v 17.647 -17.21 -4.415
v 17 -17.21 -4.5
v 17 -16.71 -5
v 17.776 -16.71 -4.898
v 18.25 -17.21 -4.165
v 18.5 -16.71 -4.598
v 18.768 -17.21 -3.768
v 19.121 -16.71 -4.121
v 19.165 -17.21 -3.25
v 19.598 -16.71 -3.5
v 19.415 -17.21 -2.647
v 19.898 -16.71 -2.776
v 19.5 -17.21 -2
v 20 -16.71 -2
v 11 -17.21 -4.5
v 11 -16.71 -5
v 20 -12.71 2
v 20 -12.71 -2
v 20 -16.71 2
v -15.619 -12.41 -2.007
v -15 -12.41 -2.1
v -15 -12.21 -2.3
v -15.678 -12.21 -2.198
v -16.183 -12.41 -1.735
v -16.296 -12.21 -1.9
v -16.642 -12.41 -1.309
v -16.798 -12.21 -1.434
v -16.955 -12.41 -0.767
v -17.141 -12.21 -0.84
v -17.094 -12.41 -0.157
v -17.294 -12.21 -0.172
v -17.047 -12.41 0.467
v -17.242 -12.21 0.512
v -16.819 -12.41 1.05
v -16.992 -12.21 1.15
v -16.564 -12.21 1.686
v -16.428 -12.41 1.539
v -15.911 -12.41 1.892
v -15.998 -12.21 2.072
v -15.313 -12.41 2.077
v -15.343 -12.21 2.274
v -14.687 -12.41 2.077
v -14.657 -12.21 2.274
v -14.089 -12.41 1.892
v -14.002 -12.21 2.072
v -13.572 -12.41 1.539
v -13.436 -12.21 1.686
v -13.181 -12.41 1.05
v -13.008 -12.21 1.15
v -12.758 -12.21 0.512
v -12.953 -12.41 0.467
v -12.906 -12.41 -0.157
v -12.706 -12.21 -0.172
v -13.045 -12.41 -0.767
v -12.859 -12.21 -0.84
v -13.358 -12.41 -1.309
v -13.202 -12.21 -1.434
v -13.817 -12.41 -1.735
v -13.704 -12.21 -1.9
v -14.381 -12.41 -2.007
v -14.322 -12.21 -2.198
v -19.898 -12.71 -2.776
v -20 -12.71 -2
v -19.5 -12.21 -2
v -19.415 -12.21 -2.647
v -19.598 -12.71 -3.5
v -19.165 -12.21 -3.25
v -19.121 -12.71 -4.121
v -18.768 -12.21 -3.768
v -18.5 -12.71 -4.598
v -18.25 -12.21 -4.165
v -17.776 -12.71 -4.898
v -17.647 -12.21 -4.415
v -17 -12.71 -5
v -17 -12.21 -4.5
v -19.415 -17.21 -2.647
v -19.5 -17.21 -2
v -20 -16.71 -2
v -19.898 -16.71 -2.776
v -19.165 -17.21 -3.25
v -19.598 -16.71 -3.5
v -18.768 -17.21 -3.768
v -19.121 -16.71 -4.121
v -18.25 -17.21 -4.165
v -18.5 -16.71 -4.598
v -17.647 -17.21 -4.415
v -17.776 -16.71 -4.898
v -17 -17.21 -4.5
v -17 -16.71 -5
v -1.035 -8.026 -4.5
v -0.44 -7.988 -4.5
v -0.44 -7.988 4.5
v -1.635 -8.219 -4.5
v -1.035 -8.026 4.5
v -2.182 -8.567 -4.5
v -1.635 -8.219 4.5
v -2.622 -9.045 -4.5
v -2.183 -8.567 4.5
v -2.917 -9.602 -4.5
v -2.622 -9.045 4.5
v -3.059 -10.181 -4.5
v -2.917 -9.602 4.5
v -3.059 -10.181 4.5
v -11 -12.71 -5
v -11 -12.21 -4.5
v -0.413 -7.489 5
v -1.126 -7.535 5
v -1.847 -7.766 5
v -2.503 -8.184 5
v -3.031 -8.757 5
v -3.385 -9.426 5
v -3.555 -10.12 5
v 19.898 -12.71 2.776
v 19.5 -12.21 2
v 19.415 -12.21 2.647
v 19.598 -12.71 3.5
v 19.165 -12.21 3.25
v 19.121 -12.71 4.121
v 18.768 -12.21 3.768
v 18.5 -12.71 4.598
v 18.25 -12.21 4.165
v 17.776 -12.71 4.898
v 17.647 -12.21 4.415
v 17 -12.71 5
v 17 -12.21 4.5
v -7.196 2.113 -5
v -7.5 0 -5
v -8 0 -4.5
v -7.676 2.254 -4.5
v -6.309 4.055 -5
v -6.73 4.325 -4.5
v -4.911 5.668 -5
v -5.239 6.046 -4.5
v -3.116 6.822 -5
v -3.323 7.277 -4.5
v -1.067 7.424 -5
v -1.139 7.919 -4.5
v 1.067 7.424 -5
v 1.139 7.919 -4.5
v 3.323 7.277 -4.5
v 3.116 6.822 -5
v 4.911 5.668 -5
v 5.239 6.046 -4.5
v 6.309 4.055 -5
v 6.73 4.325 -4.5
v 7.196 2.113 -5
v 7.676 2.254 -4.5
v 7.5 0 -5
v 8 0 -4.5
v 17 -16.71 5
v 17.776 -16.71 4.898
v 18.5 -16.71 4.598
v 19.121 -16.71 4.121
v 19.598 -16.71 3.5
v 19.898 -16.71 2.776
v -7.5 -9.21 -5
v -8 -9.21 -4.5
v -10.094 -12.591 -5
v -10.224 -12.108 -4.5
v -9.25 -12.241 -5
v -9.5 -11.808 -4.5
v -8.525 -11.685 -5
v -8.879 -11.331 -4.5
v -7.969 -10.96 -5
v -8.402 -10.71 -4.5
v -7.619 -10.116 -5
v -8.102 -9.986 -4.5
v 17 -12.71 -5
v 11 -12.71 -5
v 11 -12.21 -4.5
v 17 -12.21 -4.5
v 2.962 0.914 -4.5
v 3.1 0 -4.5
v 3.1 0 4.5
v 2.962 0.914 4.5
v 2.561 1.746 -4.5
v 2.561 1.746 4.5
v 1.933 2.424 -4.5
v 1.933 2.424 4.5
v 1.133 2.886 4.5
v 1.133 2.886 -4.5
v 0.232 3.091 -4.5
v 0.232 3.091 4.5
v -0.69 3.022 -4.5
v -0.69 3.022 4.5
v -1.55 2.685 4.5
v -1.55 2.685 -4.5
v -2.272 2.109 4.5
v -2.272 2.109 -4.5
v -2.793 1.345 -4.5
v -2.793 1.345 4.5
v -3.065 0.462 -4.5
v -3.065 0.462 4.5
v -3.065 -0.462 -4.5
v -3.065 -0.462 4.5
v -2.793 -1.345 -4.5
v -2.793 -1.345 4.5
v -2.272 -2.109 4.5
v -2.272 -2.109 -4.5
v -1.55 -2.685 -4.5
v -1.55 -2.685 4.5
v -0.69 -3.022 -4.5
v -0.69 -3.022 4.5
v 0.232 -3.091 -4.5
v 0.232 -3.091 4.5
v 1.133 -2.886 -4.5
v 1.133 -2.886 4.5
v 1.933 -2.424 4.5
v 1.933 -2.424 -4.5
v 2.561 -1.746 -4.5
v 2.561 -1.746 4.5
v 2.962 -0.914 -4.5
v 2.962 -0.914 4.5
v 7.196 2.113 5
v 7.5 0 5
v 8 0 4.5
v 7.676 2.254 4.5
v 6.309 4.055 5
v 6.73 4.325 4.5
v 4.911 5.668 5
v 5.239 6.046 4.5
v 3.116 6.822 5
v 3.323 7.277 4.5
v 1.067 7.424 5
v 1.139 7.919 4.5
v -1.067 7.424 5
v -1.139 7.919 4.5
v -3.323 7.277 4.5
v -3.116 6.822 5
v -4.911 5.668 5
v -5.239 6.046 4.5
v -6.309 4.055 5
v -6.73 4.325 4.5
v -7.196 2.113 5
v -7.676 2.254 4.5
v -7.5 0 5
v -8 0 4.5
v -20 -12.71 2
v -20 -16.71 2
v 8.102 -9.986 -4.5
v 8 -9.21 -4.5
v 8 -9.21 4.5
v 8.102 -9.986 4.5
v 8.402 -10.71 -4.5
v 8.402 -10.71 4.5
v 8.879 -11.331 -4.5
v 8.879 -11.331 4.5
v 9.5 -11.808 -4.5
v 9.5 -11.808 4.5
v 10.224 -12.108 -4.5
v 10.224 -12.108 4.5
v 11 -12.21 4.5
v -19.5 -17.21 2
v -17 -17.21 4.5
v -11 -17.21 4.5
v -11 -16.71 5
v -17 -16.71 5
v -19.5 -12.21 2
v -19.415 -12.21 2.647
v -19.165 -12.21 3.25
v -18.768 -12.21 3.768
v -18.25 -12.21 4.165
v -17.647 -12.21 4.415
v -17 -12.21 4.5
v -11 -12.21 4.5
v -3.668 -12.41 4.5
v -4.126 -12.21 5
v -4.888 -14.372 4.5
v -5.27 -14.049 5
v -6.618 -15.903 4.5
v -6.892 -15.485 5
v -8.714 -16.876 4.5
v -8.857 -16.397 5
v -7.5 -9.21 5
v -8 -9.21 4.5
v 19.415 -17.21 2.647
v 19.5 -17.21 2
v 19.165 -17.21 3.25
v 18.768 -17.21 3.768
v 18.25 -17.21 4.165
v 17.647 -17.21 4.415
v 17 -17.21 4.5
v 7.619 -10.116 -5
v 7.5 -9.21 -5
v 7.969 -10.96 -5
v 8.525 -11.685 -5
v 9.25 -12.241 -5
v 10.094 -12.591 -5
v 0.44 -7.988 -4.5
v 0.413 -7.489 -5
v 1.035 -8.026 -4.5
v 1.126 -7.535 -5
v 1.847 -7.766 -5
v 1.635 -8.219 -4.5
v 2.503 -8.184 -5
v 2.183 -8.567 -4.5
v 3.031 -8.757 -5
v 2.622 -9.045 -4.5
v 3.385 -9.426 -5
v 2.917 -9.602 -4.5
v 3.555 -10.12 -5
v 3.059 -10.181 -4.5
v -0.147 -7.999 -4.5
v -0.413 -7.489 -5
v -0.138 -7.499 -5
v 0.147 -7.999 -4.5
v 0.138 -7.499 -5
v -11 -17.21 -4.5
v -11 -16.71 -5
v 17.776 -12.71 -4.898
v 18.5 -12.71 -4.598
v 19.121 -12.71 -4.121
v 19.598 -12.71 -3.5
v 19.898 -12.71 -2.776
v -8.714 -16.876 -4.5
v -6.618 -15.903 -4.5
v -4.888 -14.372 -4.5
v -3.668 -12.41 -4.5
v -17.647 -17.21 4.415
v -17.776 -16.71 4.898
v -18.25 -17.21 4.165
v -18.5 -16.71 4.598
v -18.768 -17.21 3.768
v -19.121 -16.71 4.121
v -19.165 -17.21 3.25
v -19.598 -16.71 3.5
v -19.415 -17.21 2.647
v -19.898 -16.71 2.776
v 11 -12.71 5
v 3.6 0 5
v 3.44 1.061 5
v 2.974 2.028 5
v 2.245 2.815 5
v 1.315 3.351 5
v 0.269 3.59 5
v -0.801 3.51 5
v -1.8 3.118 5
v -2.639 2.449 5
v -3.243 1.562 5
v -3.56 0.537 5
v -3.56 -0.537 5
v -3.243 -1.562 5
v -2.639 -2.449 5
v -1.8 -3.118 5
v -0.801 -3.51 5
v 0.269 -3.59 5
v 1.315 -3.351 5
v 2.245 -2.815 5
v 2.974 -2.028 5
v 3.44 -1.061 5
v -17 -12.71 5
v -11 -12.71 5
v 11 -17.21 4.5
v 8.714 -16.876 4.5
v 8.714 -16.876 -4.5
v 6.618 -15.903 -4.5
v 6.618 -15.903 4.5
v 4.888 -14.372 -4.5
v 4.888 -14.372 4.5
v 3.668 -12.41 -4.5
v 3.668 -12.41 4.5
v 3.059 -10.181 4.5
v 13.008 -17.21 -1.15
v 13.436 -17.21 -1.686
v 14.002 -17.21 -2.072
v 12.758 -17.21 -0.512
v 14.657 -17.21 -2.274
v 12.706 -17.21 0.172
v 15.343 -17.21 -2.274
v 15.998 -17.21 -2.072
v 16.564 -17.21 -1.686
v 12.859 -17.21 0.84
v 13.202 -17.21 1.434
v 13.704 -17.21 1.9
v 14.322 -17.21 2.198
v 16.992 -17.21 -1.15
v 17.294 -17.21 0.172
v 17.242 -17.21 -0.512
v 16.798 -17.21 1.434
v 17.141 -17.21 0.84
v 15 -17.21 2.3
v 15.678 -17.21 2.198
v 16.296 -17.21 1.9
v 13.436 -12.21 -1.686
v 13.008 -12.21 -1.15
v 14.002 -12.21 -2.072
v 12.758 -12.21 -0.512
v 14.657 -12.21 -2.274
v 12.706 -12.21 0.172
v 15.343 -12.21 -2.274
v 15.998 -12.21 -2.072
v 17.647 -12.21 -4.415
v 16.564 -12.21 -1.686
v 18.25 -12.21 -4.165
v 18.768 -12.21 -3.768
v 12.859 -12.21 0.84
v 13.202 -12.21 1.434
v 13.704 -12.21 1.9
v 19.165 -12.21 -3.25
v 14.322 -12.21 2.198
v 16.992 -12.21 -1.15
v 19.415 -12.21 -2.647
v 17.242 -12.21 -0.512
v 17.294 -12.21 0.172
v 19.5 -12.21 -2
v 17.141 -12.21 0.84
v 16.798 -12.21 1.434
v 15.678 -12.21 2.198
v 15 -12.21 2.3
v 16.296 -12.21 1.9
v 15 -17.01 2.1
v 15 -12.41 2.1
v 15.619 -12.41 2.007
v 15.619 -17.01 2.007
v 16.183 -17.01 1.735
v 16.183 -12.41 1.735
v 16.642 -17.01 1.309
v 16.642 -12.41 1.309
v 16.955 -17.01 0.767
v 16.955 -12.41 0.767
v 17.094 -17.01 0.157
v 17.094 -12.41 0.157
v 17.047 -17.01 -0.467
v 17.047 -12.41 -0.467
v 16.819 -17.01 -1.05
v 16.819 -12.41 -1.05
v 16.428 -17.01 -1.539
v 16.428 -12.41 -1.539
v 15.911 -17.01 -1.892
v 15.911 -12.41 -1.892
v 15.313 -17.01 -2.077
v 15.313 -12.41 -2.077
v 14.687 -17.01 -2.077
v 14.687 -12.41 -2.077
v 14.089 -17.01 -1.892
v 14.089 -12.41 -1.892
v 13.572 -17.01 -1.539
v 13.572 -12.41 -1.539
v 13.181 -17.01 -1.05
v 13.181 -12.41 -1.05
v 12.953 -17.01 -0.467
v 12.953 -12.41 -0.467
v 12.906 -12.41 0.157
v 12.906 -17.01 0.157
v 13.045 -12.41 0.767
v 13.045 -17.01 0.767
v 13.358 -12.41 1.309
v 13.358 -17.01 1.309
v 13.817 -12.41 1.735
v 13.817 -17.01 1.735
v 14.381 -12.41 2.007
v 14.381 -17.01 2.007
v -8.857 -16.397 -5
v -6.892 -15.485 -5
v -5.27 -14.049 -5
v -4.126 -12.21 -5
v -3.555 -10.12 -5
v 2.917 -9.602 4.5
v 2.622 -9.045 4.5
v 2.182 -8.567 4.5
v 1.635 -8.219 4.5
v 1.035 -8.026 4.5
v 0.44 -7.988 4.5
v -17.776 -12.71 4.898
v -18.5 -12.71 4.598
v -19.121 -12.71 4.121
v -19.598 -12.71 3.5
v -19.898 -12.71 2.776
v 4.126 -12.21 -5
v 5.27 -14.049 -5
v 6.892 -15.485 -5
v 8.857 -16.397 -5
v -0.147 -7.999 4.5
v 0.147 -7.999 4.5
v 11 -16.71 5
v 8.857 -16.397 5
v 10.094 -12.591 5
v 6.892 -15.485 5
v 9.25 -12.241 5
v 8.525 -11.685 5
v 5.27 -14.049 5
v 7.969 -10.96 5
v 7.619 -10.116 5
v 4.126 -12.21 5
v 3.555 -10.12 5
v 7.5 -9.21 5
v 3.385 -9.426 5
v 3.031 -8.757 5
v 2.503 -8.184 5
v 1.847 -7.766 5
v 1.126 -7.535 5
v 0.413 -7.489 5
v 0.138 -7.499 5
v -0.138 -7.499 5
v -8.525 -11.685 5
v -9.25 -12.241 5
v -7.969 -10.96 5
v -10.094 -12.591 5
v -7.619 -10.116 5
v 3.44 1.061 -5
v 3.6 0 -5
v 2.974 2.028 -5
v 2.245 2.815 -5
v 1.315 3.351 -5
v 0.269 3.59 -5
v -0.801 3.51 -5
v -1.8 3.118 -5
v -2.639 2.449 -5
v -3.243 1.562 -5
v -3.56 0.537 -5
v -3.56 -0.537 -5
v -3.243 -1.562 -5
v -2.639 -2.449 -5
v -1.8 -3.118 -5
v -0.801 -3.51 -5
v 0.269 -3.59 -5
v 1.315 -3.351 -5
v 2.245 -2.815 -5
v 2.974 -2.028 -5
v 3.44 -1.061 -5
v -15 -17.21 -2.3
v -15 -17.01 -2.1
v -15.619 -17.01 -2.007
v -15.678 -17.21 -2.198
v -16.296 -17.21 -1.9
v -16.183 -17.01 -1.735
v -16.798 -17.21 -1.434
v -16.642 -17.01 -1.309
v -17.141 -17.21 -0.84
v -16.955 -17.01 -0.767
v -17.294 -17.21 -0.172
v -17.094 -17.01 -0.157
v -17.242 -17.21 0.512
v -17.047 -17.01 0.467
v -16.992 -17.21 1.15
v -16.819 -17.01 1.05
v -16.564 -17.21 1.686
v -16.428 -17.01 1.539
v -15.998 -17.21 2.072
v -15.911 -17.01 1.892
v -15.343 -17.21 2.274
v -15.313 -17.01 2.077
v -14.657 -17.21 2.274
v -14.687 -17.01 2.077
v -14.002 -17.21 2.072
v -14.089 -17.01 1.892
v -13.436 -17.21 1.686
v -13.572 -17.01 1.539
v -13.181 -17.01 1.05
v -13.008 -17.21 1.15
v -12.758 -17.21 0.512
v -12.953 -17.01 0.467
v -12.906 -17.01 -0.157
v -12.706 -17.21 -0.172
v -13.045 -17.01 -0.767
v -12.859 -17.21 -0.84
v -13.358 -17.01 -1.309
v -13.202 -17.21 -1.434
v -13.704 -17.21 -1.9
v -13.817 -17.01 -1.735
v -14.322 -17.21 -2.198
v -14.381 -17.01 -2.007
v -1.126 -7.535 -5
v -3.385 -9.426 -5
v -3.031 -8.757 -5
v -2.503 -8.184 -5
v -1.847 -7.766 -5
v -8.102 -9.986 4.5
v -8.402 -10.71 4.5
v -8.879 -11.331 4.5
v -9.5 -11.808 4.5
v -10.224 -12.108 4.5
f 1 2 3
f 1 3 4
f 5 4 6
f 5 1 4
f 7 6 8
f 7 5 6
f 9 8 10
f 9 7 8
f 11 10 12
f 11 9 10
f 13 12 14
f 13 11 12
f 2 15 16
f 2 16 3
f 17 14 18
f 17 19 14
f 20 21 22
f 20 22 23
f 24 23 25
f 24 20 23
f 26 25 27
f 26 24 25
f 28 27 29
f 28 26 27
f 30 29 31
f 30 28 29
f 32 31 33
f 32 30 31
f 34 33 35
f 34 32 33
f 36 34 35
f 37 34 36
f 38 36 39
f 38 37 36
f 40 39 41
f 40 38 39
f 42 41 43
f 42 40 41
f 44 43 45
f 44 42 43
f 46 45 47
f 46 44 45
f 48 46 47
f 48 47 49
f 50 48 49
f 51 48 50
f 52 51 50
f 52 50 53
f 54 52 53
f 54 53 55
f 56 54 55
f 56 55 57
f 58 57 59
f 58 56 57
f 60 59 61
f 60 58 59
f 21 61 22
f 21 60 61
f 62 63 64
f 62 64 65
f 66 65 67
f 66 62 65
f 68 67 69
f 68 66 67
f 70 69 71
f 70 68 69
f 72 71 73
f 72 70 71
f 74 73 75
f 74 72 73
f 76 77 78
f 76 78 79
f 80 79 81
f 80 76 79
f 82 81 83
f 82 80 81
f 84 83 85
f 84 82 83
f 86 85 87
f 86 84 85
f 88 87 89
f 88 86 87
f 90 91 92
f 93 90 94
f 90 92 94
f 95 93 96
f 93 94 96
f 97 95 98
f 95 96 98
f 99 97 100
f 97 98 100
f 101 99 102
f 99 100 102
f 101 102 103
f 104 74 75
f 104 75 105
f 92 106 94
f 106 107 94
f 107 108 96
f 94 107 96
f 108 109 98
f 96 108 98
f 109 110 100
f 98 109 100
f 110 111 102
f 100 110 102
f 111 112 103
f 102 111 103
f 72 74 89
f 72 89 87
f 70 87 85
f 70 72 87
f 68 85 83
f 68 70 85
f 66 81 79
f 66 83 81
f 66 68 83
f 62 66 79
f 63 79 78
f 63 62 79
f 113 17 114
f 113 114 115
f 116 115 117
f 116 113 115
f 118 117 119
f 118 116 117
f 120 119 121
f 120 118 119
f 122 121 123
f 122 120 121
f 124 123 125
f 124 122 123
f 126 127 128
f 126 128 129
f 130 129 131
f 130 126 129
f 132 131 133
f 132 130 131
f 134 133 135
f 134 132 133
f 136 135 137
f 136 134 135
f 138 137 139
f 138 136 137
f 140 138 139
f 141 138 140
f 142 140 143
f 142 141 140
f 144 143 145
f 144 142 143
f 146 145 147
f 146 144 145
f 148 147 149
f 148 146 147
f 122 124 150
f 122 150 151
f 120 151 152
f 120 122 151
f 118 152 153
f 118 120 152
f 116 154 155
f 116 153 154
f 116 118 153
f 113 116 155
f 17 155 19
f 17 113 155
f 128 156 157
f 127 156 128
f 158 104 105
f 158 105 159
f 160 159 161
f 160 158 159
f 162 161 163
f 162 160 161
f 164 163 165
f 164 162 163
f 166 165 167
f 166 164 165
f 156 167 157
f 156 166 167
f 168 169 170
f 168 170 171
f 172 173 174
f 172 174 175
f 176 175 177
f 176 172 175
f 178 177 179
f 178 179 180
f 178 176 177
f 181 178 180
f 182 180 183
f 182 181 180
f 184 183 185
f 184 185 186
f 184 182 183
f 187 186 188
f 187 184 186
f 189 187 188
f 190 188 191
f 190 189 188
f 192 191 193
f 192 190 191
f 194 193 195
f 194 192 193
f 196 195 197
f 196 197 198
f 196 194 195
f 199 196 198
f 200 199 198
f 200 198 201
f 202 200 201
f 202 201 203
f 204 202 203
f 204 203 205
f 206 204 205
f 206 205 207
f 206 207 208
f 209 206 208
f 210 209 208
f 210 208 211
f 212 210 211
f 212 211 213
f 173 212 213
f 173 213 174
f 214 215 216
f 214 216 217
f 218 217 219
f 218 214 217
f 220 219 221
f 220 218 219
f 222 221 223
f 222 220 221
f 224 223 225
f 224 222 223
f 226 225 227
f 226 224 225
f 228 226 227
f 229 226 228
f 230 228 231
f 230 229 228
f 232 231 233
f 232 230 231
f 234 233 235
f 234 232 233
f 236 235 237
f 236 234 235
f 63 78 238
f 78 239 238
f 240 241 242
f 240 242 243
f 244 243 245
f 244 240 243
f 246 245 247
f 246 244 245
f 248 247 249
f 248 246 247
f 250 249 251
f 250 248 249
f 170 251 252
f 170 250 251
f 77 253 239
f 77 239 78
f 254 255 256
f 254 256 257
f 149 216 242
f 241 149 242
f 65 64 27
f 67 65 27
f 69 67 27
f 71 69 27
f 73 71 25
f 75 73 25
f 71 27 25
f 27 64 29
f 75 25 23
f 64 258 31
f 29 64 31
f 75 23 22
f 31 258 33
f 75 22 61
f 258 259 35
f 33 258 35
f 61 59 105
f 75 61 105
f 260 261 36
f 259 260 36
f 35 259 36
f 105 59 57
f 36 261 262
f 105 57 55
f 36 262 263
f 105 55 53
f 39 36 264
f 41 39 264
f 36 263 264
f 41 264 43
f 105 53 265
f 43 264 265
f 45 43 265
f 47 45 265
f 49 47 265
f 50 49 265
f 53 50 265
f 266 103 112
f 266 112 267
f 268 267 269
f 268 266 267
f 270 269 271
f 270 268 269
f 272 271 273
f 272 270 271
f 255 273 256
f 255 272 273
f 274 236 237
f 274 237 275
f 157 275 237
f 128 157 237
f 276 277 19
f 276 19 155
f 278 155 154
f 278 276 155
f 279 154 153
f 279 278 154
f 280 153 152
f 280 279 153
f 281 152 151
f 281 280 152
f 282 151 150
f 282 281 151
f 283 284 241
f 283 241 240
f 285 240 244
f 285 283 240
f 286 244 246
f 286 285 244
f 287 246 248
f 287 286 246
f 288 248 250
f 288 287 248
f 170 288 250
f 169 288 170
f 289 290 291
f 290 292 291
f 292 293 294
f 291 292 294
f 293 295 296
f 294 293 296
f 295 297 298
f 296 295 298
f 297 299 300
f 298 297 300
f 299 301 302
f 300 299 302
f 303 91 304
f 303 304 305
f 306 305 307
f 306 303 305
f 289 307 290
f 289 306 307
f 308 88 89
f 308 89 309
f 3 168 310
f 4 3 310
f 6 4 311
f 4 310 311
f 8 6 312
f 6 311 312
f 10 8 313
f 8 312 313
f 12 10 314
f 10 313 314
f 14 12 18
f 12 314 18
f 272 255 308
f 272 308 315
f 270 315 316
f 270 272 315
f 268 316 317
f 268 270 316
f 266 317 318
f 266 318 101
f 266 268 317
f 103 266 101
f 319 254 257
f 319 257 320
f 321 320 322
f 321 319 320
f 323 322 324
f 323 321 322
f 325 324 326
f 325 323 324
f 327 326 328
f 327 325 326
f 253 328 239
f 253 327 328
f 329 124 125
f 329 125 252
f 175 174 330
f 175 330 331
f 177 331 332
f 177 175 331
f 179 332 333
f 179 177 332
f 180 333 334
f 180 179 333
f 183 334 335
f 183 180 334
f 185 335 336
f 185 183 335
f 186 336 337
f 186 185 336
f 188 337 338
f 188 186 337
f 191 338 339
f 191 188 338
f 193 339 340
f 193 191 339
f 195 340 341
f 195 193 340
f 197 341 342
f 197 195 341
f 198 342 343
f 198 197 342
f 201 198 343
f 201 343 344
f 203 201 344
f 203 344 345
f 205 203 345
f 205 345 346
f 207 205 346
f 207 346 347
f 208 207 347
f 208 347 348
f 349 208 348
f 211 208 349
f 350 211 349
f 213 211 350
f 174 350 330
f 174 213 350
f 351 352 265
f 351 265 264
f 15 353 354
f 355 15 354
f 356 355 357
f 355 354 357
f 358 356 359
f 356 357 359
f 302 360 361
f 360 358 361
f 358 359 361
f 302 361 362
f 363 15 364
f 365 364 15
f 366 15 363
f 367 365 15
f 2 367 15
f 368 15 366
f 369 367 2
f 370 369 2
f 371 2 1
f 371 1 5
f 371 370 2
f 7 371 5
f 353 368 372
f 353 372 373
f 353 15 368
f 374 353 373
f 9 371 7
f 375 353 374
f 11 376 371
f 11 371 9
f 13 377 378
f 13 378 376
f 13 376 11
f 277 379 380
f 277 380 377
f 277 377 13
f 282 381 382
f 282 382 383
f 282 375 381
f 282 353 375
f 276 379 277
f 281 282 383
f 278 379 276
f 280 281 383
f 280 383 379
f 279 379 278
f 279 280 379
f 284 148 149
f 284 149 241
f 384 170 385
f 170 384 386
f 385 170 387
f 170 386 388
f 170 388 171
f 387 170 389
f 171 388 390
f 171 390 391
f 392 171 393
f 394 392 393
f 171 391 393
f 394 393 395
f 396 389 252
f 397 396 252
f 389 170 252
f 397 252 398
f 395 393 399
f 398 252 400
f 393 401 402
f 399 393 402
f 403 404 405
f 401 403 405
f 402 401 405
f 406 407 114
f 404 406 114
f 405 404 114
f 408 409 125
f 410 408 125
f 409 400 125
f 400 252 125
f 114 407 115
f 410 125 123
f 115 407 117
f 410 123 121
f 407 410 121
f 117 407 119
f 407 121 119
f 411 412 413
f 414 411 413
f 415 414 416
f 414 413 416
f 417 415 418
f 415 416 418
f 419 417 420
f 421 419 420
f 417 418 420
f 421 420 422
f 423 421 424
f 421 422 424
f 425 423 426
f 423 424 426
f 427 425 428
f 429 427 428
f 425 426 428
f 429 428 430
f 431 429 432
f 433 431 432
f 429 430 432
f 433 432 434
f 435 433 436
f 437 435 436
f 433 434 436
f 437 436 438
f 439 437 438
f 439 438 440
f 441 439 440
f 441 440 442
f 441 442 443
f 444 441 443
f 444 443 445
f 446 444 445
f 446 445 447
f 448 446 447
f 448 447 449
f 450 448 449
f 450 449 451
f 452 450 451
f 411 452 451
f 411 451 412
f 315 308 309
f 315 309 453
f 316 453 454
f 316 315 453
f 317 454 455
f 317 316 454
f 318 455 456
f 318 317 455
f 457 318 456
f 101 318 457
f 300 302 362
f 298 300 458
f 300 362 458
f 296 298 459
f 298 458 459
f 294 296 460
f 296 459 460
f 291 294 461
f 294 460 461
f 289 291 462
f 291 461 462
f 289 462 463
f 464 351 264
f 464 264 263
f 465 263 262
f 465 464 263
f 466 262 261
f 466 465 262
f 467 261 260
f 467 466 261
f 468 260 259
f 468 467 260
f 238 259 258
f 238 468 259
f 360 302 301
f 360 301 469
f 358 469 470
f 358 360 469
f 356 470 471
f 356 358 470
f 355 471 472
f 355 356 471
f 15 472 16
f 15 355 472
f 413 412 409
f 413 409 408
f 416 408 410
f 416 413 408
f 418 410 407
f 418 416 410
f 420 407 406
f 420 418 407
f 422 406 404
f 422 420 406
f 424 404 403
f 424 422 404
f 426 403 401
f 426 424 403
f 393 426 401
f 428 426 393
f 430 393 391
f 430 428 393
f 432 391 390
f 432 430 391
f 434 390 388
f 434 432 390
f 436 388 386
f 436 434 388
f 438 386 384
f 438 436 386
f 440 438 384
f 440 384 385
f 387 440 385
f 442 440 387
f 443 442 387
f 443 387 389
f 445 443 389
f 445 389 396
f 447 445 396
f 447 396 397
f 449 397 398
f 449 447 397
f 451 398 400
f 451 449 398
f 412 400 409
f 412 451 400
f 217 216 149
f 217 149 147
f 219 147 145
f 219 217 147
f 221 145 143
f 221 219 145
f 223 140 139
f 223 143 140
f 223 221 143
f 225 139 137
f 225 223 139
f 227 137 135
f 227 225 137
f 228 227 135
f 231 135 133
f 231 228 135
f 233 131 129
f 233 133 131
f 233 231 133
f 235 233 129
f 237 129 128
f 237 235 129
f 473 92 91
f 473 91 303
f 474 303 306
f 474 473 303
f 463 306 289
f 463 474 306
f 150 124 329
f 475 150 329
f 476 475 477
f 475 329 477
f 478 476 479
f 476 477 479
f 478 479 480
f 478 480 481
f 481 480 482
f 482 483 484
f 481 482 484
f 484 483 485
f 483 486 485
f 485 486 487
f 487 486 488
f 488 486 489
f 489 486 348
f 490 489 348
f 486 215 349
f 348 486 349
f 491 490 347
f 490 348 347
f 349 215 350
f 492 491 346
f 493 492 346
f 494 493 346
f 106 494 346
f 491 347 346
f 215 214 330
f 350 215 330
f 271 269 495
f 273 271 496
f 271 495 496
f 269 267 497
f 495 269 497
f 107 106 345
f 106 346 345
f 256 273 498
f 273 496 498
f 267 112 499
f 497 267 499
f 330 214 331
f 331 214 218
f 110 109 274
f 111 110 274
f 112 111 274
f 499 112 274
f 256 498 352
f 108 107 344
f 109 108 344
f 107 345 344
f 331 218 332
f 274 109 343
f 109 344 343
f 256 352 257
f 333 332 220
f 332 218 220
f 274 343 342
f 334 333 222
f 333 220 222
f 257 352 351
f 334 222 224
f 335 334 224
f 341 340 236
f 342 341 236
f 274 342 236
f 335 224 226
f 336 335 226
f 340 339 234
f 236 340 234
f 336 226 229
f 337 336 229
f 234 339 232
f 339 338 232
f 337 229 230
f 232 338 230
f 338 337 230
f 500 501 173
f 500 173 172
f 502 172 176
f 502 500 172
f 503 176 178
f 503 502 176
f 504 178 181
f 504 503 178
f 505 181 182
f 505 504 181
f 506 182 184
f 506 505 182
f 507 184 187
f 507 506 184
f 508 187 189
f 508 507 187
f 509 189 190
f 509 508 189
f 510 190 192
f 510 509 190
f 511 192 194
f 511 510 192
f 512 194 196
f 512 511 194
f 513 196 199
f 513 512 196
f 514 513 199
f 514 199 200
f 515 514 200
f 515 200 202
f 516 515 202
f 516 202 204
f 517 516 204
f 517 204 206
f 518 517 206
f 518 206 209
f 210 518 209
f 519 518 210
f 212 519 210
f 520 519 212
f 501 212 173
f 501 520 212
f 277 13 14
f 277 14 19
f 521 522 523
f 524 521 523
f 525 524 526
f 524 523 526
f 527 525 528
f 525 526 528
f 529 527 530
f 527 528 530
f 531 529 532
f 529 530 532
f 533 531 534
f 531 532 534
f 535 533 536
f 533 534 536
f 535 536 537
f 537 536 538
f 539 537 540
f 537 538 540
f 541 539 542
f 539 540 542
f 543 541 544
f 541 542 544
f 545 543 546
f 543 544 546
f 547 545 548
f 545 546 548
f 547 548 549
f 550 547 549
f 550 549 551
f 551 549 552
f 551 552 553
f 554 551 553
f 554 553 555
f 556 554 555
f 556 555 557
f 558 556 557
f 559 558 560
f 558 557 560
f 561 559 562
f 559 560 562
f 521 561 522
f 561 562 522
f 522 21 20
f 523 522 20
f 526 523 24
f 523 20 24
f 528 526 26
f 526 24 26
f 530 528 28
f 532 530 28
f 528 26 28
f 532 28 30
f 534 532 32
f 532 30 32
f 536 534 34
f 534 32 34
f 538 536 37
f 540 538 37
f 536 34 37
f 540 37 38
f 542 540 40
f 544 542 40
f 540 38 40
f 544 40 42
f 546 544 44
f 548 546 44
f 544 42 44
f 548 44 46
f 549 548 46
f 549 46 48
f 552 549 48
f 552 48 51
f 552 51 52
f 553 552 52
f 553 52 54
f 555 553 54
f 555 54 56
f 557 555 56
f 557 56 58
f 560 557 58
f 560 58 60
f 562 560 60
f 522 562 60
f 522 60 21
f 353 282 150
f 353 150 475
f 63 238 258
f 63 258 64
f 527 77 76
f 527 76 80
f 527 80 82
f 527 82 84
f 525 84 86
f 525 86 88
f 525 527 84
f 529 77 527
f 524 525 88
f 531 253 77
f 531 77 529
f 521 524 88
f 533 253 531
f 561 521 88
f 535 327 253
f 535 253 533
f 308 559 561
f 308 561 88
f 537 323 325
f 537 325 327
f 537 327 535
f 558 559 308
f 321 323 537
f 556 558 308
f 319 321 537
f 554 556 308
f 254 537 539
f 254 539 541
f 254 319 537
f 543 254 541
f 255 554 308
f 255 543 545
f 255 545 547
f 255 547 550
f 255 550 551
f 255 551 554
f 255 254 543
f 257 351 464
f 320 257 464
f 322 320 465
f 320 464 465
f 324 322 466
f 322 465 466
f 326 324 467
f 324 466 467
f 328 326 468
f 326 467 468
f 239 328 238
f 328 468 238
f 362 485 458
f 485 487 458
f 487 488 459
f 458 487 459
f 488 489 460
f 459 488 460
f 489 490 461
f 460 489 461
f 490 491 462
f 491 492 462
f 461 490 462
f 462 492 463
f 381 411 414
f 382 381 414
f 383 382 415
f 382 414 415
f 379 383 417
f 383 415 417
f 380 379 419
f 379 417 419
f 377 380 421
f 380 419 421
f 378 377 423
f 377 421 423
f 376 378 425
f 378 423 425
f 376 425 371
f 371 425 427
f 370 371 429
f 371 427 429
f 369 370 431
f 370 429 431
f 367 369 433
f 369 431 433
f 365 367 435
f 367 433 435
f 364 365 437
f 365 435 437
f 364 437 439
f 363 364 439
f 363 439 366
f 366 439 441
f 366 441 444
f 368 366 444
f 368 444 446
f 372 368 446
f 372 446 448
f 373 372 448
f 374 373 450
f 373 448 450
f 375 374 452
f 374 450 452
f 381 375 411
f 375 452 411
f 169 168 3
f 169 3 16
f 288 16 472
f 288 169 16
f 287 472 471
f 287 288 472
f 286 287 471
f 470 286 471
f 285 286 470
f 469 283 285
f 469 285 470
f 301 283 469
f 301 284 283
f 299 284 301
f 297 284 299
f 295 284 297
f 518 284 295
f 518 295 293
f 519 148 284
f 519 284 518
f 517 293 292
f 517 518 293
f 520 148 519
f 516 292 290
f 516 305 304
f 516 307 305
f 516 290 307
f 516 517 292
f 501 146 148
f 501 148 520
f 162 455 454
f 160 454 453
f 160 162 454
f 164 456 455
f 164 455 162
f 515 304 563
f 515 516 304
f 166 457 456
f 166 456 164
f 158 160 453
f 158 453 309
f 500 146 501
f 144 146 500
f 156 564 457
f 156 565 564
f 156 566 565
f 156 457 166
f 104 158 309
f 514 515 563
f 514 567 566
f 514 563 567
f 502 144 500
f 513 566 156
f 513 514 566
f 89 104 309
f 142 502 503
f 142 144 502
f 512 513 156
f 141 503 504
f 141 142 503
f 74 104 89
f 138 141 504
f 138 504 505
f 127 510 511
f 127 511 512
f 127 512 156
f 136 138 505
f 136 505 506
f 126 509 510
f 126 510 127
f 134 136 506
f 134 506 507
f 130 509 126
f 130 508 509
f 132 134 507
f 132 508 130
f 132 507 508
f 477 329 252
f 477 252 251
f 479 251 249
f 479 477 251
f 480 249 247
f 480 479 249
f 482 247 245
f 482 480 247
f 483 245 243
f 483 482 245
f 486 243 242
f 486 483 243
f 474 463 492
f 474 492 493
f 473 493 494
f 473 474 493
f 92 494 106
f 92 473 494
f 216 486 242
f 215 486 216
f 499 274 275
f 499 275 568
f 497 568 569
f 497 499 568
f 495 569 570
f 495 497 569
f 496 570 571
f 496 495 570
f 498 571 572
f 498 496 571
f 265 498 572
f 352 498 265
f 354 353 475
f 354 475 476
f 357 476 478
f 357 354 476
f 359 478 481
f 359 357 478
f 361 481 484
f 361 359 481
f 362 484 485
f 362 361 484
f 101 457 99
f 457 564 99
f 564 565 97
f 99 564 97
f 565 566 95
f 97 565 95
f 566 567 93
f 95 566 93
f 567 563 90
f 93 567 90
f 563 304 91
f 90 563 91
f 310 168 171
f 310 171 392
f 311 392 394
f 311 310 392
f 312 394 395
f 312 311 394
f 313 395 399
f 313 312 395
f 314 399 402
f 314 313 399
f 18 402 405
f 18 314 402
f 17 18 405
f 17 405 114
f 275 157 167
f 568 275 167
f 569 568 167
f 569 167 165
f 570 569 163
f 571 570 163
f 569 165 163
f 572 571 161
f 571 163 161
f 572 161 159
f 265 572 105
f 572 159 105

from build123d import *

# Parameters (mm, degrees)
SKETCH_1_R        = 8
SKETCH_1_R_2      = 3.1
EXTRUDE_1_DEPTH   = 5
SKETCH_1_W        = 40
SKETCH_1_H        = 5
EXTRUDE_1_2_DEPTH = 5
CHAMFER_7_SIZE    = 0.5
EXTRUDE1_START    = -10
EXTRUDE1_DEPTH    = 10
FILLET1_R         = 3
EXTRUDE2_START    = -4.5
EXTRUDE2_DEPTH    = 4.5
FILLET2_R         = 8
SKETCH3_R         = 2.1
EXTRUDE3_DEPTH    = 29.869431931
CHAMFER2_SIZE     = 0.2
EXTRUDE4_DEPTH    = 27.952441448
FILLET3_R         = 2.5
FILLET4_R         = 3
CHAMFER4_SIZE     = 0.5


with BuildPart() as part:
    # 草图1 → 凸台-拉伸1 (new, symmetric)
    with BuildSketch(Plane.XY):
        Circle(SKETCH_1_R)
        Circle(SKETCH_1_R_2, mode=Mode.SUBTRACT)
    extrude(amount=EXTRUDE_1_DEPTH, both=True)

    # 倒角7
    chamfer_7_edges = [part.edges().sort_by_distance(p)[0] for p in [
        (-3.1, 0, -5),
        (-3.1, 0, 5),
    ]]
    chamfer(chamfer_7_edges, length=CHAMFER_7_SIZE)



with BuildPart() as body_2:
    # 草图1 → Extrude 1 2 (new, symmetric)
    with BuildSketch(Plane.XY):
        with Locations((0, -14.71)):
            Rectangle(SKETCH_1_W, SKETCH_1_H)
    extrude(amount=EXTRUDE_1_2_DEPTH, both=True)


with BuildPart() as part_1:
    add(part.part)

    add(body_2.part)  # Extrude1 merges body 2
    # Sketch1 → Extrude1 (add)
    with BuildSketch(Plane(origin=(0, 0, -5), x_dir=(-1, 0, 0), z_dir=(0, 0, -1)).offset(EXTRUDE1_START)):
        with BuildLine():
            ThreePointArc((8, 0), (0, -8), (-8, 0))
            Line((-8, 0), (-8, -12.21))
            Line((-8, -12.21), (8, -12.21))
            Line((8, -12.21), (8, 0))
        make_face()
    extrude(amount=EXTRUDE1_DEPTH)

    # Fillet1
    fillet1_edges = [part_1.edges().sort_by_distance(p)[0] for p in [
        (8, -12.21, 0),
        (-8, -12.21, 0),
    ]]
    fillet(fillet1_edges, radius=FILLET1_R)

    # Sketch2 → Extrude2 (cut)
    with BuildSketch(Plane(origin=(0, 0, -5), x_dir=(-1, 0, 0), z_dir=(0, 0, -1)).offset(EXTRUDE2_START)):
        with BuildLine():
            ThreePointArc((3, -7.416198487), (0, -8), (-3, -7.416198487))
            Line((-3, -7.416198487), (-3, -17.21))
            Line((-3, -17.21), (3, -17.21))
            Line((3, -17.21), (3, -7.416198487))
        make_face()
    extrude2 = extrude(amount=EXTRUDE2_DEPTH, mode=Mode.SUBTRACT)

    # Mirror1: Extrude2 across plane
    add(extrude2.mirror(Plane.XY), mode=Mode.SUBTRACT)

    # Fillet2
    fillet2_edges = [part_1.edges().sort_by_distance(p)[0] for p in [
        (-3, -17.21, -2.75),
        (3, -17.21, -2.75),
        (3, -17.21, 2.75),
        (-3, -17.21, 2.75),
    ]]
    fillet(fillet2_edges, radius=FILLET2_R)

    # Sketch3 → Extrude3 (cut, through all)
    with BuildSketch(Plane(origin=(0, -12.21, 0), x_dir=(1, 0, 0), z_dir=(0, 1, 0))):
        with Locations(Location((15, 0, 0), (0, 0, 270))):
            Circle(SKETCH3_R)
        with Locations(Location((-15, 0, 0), (0, 0, 90))):
            Circle(SKETCH3_R)
    extrude(amount=-EXTRUDE3_DEPTH, mode=Mode.SUBTRACT)

    # Chamfer2
    chamfer2_edges = [part_1.edges().sort_by_distance(p)[0] for p in [
        (15, -17.21, -2.1),
        (15, -12.21, -2.1),
        (-15, -17.21, 2.1),
        (-15, -12.21, 2.1),
    ]]
    chamfer(chamfer2_edges, length=CHAMFER2_SIZE)

    # Sketch4 → Extrude4 (cut, through all)
    with BuildSketch(Plane(origin=(0, 0, -0.5), x_dir=(-1, 0, 0), z_dir=(0, 0, -1))):
        with BuildLine():
            Line((-11, -17.21), (11, -17.21))
            ThreePointArc((11, -17.21), (5.343145751, -14.866854249), (3, -9.21))
            Line((3, -9.21), (3, -7.416198487))
            ThreePointArc((3, -7.416198487), (0, -8), (-3, -7.416198487))
            Line((-3, -7.416198487), (-3, -9.21))
            ThreePointArc((-3, -9.21), (-5.343145751, -14.866854249), (-11, -17.21))
        make_face()
    extrude(amount=-EXTRUDE4_DEPTH, mode=Mode.SUBTRACT)

    # Fillet3
    fillet3_edges = [part_1.edges().sort_by_distance(p)[0] for p in [
        (-3, -7.416198487, 0),
        (3, -7.416198487, 0),
    ]]
    fillet(fillet3_edges, radius=FILLET3_R)

    # Fillet4
    fillet4_edges = [part_1.edges().sort_by_distance(p)[0] for p in [
        (20, -14.71, -5),
        (-20, -14.71, 5),
        (20, -14.71, 5),
        (-20, -14.71, -5),
    ]]
    fillet(fillet4_edges, radius=FILLET4_R)

    # Chamfer4
    chamfer4_edges = [part_1.edges().sort_by_distance(p)[0] for p in [
        (0, 8, 5),
        (0, -8, -5),
        (8, -4.605, -5),
        (0, -8, 5),
        (-5.697451281, -15.200240152, -5),
        (5.697451281, -15.200240152, 5),
        (-2.182501473, -8.567267514, -5),
        (-2.182501473, -8.567267514, 5),
        (8, -4.605, 5),
        (2.182501473, -8.567267514, -5),
        (2.182501473, -8.567267514, 5),
        (-14, -17.21, -5),
        (-14, -12.21, -5),
        (-14, -12.21, 5),
        (-20, -12.21, 0),
        (-19.121320344, -12.21, 4.121320344),
        (-19.121320344, -12.21, -4.121320344),
        (-20, -17.21, 0),
        (-14, -17.21, 5),
        (-19.121320344, -17.21, 4.121320344),
        (-19.121320344, -17.21, -4.121320344),
        (20, -12.21, 0),
        (20, -17.21, 0),
        (19.121320344, -12.21, 4.121320344),
        (19.121320344, -12.21, -4.121320344),
        (19.121320344, -17.21, 4.121320344),
        (19.121320344, -17.21, -4.121320344),
        (0, 8, -5),
        (-8, -4.605, 5),
        (-8, -4.605, -5),
        (14, -12.21, 5),
        (14, -12.21, -5),
        (-8.878679656, -11.331320344, -5),
        (-8.878679656, -11.331320344, 5),
        (8.878679656, -11.331320344, -5),
        (8.878679656, -11.331320344, 5),
        (14, -17.21, -5),
        (14, -17.21, 5),
        (-5.697451281, -15.200240152, 5),
        (5.697451281, -15.200240152, -5),
    ]]
    chamfer(chamfer4_edges, length=CHAMFER4_SIZE)


solid = part_1.part
